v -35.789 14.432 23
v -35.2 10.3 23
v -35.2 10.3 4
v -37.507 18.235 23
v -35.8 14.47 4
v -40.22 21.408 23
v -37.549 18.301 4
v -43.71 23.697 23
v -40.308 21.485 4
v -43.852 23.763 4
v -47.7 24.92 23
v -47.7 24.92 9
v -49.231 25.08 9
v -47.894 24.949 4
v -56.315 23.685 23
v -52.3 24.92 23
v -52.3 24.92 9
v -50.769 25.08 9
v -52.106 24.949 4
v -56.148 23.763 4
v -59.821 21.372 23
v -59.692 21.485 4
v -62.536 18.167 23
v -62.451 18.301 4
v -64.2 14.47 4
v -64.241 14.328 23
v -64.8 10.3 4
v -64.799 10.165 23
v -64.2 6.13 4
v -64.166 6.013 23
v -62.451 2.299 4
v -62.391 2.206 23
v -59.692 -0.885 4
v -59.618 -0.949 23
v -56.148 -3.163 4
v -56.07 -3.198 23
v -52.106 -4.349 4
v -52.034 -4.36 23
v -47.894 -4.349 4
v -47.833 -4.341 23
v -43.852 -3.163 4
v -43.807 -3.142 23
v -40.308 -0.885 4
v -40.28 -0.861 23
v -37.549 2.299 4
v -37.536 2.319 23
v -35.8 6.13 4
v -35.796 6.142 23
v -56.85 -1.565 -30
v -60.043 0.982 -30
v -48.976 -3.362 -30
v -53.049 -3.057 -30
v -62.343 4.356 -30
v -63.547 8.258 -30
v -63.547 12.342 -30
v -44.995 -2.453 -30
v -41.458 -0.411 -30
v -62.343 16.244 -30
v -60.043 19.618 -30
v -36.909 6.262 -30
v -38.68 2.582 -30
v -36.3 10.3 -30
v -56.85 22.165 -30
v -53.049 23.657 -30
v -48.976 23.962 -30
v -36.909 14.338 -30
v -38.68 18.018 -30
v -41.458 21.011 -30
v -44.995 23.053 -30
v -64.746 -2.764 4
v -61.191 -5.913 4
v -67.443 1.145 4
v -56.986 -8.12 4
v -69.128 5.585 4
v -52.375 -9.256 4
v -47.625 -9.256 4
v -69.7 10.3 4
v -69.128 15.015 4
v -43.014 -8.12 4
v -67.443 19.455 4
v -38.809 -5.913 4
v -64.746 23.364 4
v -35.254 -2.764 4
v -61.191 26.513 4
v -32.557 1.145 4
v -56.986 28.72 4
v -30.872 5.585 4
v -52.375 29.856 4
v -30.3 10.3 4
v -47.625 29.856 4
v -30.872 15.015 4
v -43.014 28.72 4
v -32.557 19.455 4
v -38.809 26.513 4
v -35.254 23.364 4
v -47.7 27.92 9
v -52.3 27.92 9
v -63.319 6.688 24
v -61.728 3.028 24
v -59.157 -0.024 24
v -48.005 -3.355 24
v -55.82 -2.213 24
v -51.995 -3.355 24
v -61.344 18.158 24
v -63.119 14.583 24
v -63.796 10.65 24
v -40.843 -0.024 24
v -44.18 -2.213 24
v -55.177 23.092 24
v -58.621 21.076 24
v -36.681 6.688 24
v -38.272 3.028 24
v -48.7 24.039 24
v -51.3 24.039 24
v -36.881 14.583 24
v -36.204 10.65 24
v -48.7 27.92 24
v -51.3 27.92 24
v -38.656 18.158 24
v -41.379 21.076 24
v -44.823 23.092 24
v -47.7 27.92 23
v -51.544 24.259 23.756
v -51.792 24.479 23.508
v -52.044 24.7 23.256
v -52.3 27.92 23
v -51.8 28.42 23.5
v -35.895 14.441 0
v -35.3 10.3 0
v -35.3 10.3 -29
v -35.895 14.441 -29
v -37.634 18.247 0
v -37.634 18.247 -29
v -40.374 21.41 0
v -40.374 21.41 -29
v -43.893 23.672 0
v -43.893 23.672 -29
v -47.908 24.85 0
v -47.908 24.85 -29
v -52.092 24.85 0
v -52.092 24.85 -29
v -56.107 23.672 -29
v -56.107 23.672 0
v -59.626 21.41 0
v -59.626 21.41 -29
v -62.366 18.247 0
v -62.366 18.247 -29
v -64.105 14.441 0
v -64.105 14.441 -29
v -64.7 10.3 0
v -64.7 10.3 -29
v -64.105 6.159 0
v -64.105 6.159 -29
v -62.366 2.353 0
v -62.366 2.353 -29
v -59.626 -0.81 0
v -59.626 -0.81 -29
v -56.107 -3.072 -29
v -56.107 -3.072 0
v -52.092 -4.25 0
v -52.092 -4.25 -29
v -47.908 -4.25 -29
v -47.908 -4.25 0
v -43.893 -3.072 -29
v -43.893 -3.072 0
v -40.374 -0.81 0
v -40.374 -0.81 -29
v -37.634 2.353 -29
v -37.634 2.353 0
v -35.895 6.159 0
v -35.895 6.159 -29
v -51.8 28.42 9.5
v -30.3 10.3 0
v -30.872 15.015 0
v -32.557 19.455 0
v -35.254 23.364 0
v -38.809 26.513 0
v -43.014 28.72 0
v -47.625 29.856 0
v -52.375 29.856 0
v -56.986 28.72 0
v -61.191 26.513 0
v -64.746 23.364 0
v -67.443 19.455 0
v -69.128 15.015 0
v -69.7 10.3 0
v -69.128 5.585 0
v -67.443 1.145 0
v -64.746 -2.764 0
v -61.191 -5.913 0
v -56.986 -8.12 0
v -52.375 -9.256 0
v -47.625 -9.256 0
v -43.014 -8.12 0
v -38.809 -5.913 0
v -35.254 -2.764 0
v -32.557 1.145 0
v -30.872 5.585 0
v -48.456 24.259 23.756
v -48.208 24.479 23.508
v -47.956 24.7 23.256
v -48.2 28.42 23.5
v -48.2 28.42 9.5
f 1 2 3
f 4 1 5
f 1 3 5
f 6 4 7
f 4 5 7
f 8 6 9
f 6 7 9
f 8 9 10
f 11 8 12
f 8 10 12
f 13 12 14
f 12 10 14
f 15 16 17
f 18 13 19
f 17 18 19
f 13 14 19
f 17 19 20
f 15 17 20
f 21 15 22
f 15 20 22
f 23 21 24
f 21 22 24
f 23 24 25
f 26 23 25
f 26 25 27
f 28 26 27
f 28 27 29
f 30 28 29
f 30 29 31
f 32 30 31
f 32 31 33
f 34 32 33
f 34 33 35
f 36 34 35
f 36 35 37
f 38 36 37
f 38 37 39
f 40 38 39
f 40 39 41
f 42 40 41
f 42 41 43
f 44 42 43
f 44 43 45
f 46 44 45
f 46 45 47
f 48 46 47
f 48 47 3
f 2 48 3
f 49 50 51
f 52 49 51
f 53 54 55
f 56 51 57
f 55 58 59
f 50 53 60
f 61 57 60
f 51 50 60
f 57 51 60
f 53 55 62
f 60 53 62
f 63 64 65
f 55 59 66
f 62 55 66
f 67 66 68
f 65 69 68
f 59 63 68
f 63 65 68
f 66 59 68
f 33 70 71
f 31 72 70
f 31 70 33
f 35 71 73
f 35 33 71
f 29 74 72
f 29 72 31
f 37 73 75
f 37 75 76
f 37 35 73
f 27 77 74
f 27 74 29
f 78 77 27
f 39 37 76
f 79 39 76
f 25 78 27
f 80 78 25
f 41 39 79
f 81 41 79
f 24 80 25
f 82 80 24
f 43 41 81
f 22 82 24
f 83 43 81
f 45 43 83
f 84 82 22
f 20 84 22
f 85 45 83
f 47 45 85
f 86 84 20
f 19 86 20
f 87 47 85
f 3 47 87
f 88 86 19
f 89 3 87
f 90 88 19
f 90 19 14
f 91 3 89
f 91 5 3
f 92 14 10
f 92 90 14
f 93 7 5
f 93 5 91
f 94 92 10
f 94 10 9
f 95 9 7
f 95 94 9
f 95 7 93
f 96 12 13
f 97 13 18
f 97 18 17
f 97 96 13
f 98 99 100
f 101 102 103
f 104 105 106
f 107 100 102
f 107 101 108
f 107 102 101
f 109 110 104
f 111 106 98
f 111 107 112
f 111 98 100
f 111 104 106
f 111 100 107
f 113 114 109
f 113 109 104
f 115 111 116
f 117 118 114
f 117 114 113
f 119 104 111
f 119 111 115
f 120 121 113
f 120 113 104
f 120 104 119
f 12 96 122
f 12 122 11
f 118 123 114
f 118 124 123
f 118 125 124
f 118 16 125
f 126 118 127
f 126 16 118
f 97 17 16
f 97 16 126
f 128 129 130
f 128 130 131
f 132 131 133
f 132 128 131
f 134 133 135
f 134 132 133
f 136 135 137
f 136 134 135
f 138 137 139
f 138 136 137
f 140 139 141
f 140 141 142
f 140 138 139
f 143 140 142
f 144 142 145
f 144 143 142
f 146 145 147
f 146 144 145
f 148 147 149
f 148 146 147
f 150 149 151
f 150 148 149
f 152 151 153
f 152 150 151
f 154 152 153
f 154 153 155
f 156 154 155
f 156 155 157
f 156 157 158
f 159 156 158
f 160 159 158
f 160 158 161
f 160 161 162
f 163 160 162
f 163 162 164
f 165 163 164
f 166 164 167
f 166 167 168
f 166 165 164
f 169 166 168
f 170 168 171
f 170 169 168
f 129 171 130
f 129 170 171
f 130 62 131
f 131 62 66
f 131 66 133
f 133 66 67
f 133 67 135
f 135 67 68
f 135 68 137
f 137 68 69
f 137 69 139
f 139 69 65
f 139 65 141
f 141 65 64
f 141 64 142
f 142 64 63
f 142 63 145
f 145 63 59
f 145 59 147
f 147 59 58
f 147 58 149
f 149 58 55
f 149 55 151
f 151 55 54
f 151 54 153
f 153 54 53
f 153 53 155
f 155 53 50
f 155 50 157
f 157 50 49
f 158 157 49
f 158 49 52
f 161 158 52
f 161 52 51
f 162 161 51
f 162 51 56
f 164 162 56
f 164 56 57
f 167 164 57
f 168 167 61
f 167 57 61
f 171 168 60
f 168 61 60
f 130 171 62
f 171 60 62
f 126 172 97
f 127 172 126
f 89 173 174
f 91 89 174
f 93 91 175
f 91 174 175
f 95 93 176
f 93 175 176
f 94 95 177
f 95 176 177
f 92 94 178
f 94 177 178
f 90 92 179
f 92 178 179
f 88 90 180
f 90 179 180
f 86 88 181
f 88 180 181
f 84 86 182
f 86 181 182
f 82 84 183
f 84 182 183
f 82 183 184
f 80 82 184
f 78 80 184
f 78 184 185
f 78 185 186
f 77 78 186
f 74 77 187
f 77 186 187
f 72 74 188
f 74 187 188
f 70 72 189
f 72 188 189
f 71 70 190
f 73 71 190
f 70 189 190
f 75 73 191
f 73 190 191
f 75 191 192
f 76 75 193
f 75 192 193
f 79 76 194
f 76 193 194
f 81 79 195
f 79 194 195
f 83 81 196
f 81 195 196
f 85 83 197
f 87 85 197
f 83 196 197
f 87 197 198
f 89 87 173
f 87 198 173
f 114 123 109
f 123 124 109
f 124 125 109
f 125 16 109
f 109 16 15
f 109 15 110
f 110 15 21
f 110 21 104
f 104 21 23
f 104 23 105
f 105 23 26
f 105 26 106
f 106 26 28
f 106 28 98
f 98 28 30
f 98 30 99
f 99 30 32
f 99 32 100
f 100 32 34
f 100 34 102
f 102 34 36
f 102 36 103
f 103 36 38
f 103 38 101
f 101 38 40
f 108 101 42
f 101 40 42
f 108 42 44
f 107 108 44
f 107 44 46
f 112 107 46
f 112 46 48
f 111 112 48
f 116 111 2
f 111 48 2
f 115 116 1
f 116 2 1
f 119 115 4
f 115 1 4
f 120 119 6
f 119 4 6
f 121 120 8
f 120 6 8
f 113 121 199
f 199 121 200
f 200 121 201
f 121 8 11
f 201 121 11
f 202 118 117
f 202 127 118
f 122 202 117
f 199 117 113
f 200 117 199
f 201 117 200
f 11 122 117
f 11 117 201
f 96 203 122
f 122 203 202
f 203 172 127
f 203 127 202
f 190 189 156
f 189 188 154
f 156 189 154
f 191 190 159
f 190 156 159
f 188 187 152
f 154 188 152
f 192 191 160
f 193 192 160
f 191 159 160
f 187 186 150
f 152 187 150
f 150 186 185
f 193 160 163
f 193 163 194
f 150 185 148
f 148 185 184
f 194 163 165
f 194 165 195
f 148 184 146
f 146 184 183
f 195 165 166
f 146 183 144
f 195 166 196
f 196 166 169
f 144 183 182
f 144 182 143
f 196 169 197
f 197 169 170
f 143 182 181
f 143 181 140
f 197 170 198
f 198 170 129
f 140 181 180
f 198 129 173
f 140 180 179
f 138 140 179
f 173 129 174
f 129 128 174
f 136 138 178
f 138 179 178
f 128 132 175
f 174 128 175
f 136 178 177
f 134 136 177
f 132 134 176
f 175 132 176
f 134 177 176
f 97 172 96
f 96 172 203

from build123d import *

# Parameters (mm, degrees)
SKETCH1_R           = 14.7
BOSS_EXTRUDE1_DEPTH = 30
SKETCH2_R           = 19.7
BOSS_EXTRUDE2_DEPTH = 4
SKETCH3_R           = 14.8
BOSS_EXTRUDE3_DEPTH = 20
BOSS_EXTRUDE4_START = -15
BOSS_EXTRUDE4_DEPTH = 15
CHAMFER1_SIZE       = 0.5
CHAMFER2_SIZE       = 1


with BuildPart() as part:
    # Sketch1 → Boss-Extrude1 (new body)
    with BuildSketch(Plane.XY):
        with Locations((-50, 10.3)):
            Circle(SKETCH1_R)
    extrude(amount=-BOSS_EXTRUDE1_DEPTH)

    # Sketch2 → Boss-Extrude2 (add)
    with BuildSketch(Plane.XY):
        with Locations((-50, 10.3)):
            Circle(SKETCH2_R)
    extrude(amount=BOSS_EXTRUDE2_DEPTH)

    # Sketch3 → Boss-Extrude3 (add)
    with BuildSketch(Plane.XY.offset(4)):
        with Locations((-50, 10.3)):
            Circle(SKETCH3_R)
    extrude(amount=BOSS_EXTRUDE3_DEPTH)

    # Sketch5 → Boss-Extrude4 (add)
    with BuildSketch(Plane.XY.offset(24).offset(BOSS_EXTRUDE4_START)):
        with BuildLine():
            Line((-52.3, 24.920191517), (-52.3, 28.420191517))
            Line((-52.3, 28.420191517), (-47.7, 28.420191517))
            Line((-47.7, 28.420191517), (-47.7, 24.920191517))
            ThreePointArc((-47.7, 24.920191517), (-50, 25.1), (-52.3, 24.920191517))
        make_face()
    extrude(amount=BOSS_EXTRUDE4_DEPTH)

    # Chamfer1
    chamfer1_edges = [part.edges().sort_by_distance(p)[0] for p in [
        (-50, 28.420191517, 9),
        (-52.3, 28.420191517, 16.5),
        (-47.7, 28.420191517, 16.5),
        (-50, 28.420191517, 24),
    ]]
    chamfer(chamfer1_edges, length=CHAMFER1_SIZE)

    # Chamfer2
    chamfer2_edges = [part.edges().sort_by_distance(p)[0] for p in [
        (-47.7, 26.420191517, 24),
        (-52.3, 26.420191517, 24),
        (-59.617692031, -0.948999956, 24),
        (-64.7, 10.3, -30),
    ]]
    chamfer(chamfer2_edges, length=CHAMFER2_SIZE - 0.0001)  # a hair under: the kernel refuses the full size


solid = part.part
